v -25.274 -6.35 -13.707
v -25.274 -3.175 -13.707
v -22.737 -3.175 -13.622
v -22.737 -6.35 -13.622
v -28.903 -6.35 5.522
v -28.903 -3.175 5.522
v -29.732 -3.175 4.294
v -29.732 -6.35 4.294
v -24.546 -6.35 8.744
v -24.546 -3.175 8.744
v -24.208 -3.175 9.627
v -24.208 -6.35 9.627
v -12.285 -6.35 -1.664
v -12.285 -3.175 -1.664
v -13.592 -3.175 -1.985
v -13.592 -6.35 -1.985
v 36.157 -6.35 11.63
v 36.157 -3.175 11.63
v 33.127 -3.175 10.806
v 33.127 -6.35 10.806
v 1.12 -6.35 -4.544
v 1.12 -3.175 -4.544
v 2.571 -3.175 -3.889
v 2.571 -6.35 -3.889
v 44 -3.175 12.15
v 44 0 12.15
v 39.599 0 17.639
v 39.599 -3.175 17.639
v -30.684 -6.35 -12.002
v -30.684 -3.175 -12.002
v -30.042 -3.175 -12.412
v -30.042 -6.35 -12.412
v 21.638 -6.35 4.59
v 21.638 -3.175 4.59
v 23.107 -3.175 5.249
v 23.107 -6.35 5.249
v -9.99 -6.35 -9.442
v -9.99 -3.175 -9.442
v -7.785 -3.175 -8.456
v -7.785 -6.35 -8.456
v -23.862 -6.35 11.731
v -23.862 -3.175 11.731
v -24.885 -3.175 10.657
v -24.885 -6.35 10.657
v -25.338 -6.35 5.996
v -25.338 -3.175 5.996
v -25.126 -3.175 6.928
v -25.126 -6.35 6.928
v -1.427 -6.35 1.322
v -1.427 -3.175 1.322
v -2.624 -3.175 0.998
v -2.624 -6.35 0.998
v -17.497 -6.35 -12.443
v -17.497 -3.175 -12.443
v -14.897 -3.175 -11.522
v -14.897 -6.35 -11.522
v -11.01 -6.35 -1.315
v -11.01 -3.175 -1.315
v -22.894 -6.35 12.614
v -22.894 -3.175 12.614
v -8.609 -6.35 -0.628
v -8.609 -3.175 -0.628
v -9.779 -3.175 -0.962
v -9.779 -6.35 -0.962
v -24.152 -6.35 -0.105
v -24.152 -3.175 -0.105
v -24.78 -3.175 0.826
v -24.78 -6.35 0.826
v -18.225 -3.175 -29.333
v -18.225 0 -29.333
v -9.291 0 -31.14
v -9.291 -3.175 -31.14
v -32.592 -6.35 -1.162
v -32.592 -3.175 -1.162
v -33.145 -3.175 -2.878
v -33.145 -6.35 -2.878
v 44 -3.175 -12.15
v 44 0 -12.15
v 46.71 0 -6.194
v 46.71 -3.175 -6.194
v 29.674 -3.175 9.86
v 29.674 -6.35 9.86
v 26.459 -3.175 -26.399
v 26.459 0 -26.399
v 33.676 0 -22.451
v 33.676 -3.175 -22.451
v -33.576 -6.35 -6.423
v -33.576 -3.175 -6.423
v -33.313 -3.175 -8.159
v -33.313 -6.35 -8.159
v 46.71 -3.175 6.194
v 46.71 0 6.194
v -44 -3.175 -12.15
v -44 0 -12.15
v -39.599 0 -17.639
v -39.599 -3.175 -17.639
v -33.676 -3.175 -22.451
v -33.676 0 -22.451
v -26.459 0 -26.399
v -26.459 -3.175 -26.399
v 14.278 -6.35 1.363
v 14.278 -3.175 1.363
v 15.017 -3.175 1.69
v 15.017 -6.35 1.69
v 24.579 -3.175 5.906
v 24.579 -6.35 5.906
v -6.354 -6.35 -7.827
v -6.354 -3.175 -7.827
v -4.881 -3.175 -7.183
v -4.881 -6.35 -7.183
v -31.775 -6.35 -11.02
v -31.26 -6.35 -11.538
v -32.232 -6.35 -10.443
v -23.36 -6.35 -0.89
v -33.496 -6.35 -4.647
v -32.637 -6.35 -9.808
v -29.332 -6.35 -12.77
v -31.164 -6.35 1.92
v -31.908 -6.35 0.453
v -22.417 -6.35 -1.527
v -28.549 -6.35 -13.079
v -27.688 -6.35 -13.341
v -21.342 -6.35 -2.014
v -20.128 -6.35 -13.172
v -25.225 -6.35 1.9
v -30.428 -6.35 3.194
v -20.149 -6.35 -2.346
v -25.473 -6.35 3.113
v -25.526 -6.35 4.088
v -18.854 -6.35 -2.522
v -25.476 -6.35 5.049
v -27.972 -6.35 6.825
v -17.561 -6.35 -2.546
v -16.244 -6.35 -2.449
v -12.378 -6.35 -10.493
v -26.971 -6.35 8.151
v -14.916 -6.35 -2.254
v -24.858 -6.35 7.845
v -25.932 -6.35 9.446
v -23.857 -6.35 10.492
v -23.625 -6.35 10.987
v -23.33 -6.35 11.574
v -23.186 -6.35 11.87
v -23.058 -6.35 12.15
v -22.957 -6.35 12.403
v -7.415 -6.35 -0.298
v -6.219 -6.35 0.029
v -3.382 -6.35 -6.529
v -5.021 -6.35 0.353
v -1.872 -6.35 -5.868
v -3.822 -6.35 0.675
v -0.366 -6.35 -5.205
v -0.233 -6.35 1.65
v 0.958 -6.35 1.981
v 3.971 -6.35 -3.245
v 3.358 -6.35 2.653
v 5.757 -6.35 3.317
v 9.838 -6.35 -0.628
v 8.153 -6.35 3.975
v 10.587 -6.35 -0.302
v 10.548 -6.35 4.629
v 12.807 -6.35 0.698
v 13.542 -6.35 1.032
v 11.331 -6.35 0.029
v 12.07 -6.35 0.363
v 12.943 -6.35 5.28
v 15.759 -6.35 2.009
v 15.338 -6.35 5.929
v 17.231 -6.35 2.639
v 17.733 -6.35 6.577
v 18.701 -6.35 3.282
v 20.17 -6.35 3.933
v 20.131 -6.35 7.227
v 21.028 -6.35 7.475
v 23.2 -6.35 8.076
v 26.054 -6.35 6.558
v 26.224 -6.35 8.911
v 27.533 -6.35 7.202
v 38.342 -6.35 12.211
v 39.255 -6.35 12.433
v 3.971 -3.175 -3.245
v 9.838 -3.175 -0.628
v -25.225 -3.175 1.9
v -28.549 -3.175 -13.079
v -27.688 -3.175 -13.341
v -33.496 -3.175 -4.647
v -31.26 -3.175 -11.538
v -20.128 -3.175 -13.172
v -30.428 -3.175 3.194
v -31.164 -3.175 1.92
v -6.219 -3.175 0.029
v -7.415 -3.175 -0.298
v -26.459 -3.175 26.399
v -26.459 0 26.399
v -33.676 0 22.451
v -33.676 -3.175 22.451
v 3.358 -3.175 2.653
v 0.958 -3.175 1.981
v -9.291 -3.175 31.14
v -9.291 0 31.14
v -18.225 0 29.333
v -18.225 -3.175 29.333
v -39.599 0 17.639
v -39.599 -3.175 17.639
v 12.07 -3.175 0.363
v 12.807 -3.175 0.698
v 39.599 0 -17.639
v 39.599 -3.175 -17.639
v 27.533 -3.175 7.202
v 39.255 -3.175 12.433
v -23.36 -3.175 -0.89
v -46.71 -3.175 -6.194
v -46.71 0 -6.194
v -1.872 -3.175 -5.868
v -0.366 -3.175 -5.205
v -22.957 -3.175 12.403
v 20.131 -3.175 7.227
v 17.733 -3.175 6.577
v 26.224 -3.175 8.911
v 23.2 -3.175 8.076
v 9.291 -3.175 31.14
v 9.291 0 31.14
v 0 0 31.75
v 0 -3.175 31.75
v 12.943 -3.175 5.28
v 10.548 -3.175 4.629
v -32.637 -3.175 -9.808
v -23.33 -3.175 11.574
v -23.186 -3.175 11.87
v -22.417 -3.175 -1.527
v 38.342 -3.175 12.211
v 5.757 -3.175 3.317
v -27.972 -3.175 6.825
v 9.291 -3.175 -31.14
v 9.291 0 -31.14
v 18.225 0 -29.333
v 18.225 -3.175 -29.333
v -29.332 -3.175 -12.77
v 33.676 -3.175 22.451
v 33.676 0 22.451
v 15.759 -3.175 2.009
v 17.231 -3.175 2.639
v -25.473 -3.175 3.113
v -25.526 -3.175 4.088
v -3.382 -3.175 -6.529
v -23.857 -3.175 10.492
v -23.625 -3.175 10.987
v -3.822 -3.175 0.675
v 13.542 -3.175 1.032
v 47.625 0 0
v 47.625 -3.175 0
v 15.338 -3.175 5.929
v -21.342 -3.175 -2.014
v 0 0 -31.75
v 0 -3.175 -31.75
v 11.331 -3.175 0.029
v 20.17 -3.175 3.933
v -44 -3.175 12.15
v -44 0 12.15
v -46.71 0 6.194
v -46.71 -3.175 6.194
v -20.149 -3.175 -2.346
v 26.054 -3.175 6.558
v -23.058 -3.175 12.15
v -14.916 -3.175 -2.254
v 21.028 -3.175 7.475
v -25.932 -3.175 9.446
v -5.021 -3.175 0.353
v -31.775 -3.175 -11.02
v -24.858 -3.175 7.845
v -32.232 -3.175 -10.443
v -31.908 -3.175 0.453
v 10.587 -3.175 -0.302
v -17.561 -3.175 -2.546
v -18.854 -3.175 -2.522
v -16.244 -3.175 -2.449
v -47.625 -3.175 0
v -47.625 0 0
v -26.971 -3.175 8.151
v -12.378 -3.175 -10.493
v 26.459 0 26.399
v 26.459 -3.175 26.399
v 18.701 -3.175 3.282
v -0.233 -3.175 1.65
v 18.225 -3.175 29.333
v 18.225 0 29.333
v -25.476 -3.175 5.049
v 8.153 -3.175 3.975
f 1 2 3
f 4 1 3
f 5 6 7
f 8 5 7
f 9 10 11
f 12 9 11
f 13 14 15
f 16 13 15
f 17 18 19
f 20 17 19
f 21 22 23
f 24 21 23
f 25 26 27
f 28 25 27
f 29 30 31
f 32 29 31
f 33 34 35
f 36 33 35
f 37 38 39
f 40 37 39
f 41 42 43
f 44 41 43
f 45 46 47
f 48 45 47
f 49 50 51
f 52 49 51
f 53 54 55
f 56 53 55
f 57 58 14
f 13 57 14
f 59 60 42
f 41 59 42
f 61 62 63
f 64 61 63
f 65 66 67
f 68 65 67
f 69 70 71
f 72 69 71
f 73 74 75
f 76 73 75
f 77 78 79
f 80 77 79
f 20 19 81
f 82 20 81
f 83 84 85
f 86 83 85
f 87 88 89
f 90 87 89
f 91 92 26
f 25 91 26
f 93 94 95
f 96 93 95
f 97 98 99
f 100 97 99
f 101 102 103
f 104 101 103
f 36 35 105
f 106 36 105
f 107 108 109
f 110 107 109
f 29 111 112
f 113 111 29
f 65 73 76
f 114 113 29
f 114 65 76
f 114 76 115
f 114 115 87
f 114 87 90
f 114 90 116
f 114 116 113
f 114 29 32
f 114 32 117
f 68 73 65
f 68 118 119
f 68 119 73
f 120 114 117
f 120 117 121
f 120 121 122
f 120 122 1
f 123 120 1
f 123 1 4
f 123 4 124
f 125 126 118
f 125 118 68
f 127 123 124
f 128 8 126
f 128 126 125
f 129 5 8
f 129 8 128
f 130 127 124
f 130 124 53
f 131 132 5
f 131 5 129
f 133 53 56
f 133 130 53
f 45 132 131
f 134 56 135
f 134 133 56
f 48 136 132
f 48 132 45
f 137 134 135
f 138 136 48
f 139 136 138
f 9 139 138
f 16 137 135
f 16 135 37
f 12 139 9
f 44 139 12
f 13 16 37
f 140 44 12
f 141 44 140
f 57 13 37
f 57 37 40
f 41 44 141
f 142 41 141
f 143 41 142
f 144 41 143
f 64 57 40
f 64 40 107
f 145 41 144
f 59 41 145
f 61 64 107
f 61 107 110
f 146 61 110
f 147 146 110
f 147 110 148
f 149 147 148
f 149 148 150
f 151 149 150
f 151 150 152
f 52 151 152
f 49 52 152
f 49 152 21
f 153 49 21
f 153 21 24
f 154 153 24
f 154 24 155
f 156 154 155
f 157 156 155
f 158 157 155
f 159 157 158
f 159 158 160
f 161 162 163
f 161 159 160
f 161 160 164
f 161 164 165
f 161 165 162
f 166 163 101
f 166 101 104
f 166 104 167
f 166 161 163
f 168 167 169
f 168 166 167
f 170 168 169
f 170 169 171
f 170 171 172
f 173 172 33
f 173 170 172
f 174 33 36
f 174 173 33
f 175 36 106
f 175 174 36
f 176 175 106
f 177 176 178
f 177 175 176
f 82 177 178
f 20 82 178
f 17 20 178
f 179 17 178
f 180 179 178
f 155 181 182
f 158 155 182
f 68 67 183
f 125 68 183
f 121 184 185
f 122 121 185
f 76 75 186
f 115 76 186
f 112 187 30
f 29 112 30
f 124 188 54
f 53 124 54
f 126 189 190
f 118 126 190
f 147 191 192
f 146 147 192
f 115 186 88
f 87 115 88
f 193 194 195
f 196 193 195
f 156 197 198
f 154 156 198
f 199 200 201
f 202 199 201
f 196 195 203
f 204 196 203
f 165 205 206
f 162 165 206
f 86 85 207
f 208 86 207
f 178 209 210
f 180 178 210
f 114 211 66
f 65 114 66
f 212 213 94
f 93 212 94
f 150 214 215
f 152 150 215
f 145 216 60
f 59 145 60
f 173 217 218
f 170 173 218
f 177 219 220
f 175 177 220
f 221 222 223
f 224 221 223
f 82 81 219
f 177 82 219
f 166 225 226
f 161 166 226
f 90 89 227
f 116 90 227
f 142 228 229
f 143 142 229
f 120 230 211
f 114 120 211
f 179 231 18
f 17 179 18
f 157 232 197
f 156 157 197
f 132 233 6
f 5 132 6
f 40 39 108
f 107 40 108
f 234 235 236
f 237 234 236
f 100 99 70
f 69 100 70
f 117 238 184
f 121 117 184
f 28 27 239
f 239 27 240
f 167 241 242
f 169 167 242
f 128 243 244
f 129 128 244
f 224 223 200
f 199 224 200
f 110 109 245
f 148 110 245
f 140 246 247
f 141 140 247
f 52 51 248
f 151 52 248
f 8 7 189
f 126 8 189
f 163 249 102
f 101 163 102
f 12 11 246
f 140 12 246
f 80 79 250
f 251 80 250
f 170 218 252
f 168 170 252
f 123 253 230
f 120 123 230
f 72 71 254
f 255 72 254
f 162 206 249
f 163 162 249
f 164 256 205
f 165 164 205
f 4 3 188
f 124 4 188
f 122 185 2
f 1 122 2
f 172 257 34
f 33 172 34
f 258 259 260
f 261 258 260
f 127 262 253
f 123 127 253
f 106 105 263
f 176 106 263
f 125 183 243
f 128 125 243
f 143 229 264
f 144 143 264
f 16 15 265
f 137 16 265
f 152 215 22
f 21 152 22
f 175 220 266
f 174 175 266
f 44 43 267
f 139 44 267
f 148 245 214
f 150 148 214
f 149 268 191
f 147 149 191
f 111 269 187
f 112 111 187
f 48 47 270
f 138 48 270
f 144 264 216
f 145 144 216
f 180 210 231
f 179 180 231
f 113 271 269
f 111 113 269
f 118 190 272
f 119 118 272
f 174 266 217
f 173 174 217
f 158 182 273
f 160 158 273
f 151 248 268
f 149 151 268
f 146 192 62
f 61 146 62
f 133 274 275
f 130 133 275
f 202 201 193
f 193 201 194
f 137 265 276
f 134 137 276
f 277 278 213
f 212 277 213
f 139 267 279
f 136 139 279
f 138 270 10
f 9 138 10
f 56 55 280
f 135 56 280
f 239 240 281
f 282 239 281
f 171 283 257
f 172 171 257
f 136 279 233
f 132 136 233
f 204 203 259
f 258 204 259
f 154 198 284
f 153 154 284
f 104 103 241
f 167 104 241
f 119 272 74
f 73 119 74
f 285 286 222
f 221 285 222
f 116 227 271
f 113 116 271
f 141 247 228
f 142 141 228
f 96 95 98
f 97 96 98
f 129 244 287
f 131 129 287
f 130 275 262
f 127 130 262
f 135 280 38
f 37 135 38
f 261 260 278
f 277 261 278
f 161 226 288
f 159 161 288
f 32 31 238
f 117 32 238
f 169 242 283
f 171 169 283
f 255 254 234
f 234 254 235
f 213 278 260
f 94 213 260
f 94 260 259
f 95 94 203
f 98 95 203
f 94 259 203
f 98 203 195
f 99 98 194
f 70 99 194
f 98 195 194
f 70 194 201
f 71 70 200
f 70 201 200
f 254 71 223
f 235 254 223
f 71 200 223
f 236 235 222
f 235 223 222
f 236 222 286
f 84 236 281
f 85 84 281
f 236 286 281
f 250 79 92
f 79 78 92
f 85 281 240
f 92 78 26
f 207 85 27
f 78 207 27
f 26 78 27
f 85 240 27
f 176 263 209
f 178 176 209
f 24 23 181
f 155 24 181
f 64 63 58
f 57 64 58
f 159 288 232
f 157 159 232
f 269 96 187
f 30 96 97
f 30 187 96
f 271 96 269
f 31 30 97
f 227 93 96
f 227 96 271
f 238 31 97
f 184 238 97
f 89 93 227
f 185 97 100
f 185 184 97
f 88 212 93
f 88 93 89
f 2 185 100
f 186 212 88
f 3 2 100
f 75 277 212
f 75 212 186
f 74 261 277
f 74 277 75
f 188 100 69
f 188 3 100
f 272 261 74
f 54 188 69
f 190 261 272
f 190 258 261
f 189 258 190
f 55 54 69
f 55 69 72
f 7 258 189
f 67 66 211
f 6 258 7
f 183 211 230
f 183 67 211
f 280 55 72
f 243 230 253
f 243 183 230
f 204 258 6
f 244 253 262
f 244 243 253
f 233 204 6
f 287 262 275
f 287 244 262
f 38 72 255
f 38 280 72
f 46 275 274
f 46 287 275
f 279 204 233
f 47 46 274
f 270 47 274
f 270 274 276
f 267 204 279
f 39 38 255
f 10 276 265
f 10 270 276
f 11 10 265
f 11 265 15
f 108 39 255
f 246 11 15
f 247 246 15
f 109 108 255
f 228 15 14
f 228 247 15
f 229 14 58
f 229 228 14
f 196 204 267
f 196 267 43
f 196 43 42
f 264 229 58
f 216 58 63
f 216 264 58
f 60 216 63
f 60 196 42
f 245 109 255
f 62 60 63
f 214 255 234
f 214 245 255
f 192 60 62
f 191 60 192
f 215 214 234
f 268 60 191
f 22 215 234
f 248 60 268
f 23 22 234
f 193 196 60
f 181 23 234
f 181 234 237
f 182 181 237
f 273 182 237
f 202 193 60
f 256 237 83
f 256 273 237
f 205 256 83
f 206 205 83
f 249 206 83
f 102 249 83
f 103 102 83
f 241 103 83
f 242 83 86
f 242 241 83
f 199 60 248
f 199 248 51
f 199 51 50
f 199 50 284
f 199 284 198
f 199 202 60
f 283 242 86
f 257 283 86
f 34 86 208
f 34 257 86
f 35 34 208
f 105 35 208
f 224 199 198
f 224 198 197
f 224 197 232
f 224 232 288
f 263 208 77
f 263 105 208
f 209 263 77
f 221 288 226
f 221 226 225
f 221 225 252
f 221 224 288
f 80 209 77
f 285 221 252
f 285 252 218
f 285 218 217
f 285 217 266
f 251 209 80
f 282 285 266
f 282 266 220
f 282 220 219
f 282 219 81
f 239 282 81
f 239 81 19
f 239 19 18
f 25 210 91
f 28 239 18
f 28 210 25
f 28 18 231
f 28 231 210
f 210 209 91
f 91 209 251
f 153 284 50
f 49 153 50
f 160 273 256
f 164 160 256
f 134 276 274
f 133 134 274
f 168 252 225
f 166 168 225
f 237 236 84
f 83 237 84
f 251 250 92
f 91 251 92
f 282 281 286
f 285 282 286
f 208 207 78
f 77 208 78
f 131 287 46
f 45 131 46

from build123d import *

# Parameters (mm, degrees)
F1_DEPTH = 3.175
F2_DEPTH = 6.35


# Not quite as in the source:
# - a length typed as a fraction of an inch, garbled in the dataset ("3 / 203.2 mm" for 3/8 in), is restored


with BuildPart() as f1:
    # F0 (on Front) → F1 (new body)
    with BuildSketch(Plane.XZ):
        Polygon((46.7098888, -6.1941202), (47.625, 0), (46.7098888, 6.1941202), (43.9997596, 12.150217), (39.598727, 17.6393602), (33.675955, 22.4506536), (26.4590276, 26.3991598), (18.2252874, 29.33319), (9.2911676, 31.1399428), (0, 31.75), (-9.291193, 31.1399428), (-18.2253128, 29.33319), (-26.459053, 26.3991598), (-33.6759804, 22.4506536), (-39.5987524, 17.6393602), (-43.999785, 12.150217), (-46.7099142, 6.1941202), (-47.625, 0), (-46.7099142, -6.1941202), (-43.999785, -12.1501916), (-39.5987524, -17.6393602), (-33.6759804, -22.4506282), (-26.459053, -26.3991598), (-18.2253128, -29.3331646), (-9.291193, -31.1399174), (0, -31.75), (9.2911676, -31.1399174), (18.2252874, -29.3331646), (26.4590276, -26.3991598), (33.675955, -22.4506282), (39.598727, -17.6393602), (43.9997596, -12.1501916), align=None)
        Polygon((38.341681, 12.2114056), (39.2552936, 12.4328174), (27.5334984, 7.2016112), (26.0539992, 6.5582038), (24.5790974, 5.9062112), (23.1074976, 5.2491132), (21.6381838, 4.590415), (20.1697844, 3.9334948), (18.7011818, 3.2820102), (17.2311822, 2.6391108), (15.7585918, 2.008505), (15.0165816, 1.6895064), (14.2783814, 1.3633196), (13.5421878, 1.0321036), (12.8065784, 0.6979158), (12.0698768, 0.362712), (11.3305844, 0.028702), (10.5870756, -0.3020822), (9.8377756, -0.6275832), (3.9710868, -3.244596), (2.5708864, -3.8890956), (1.1199876, -4.5439838), (-0.366014, -5.2049934), (-1.8718022, -5.8679842), (-3.38201, -6.5287906), (-4.8813212, -7.1831962), (-6.3541148, -7.8269846), (-7.7852016, -8.4560918), (-9.9900232, -9.4423992), (-12.3777248, -10.4928924), (-14.8971, -11.5218972), (-17.497425, -12.4434854), (-20.1276204, -13.1720844), (-22.7367084, -13.6216898), (-25.2738128, -13.706602), (-27.6880066, -13.341096), (-28.5486094, -13.0792982), (-29.3320216, -12.7701802), (-30.0423072, -12.4116846), (-30.6835048, -12.0018048), (-31.2595006, -11.5384834), (-31.774511, -11.0196884), (-32.2323206, -10.4433878), (-32.6370188, -9.8076004), (-33.312608, -8.1586832), (-33.575625, -6.422898), (-33.4963008, -4.6470824), (-33.1451204, -2.8779978), (-32.5923148, -1.1624818), (-31.9084198, 0.4526026), (-31.1636156, 1.9203162), (-30.4284126, 3.1938976), (-29.7318176, 4.2935144), (-28.9025076, 5.5216044), (-27.9718008, 6.8250054), (-26.9710154, 8.1507076), (-25.9315204, 9.4455996), (-24.8846086, 10.6565192), (-23.8617252, 11.7305074), (-22.8942138, 12.614402), (-22.9568248, 12.4025152), (-23.0575104, 12.1500138), (-23.185501, 11.8695978), (-23.3301032, 11.5739164), (-23.6254036, 10.9873034), (-23.857204, 10.491597), (-24.207724, 9.6268032), (-24.5462044, 8.744204), (-24.8575068, 7.8445106), (-25.1264166, 6.9283072), (-25.3376176, 5.9964066), (-25.4759206, 5.0494946), (-25.5260094, 4.0882062), (-25.4729234, 3.1132018), (-25.225121, 1.8998184), (-24.779605, 0.8263128), (-24.1524028, -0.1045972), (-23.3597196, -0.8900922), (-22.417405, -1.5274036), (-21.3416134, -2.0136866), (-20.1485246, -2.3462996), (-18.8540136, -2.5223978), (-17.5612044, -2.5464008), (-16.2439096, -2.449195), (-14.9162008, -2.2540976), (-13.591921, -1.9846036), (-12.2850148, -1.6639032), (-11.009503, -1.3152882), (-9.7794064, -0.9621012), (-8.6086188, -0.6277864), (-7.4149204, -0.2975864), (-6.2186058, 0.028702), (-5.0205132, 0.3525012), (-3.8219126, 0.6751066), (-2.6237184, 0.9980168), (-1.4270228, 1.3224002), (-0.2328164, 1.6497046), (0.9576816, 1.9814032), (3.358388, 2.652903), (5.7565798, 3.3170114), (8.152892, 3.9752016), (10.547985, 4.6289976), (12.942697, 5.2796186), (15.3375868, 5.928614), (17.7332894, 6.5773046), (20.1306938, 7.227316), (21.0277964, 7.4752962), (23.2002838, 8.0761078), (26.2238998, 8.910701), (29.6740834, 9.860407), (33.1267816, 10.806303), (36.1573826, 11.6296186), align=None, mode=Mode.SUBTRACT)
    extrude(amount=F1_DEPTH)

    # F0 (on Front) → F2 (join)
    with BuildSketch(Plane.XZ):
        Polygon((27.5334984, 7.2016112), (39.2552936, 12.4328174), (38.341681, 12.2114056), (36.1573826, 11.6296186), (33.1267816, 10.806303), (29.6740834, 9.860407), (26.2238998, 8.910701), (23.2002838, 8.0761078), (21.0277964, 7.4752962), (20.1306938, 7.227316), (17.7332894, 6.5773046), (15.3375868, 5.928614), (12.942697, 5.2796186), (10.547985, 4.6289976), (8.152892, 3.9752016), (5.7565798, 3.3170114), (3.358388, 2.652903), (0.9576816, 1.9814032), (-0.2328164, 1.6497046), (-1.4270228, 1.3224002), (-2.6237184, 0.9980168), (-3.8219126, 0.6751066), (-5.0205132, 0.3525012), (-6.2186058, 0.028702), (-7.4149204, -0.2975864), (-8.6086188, -0.6277864), (-9.7794064, -0.9621012), (-11.009503, -1.3152882), (-12.2850148, -1.6639032), (-13.591921, -1.9846036), (-14.9162008, -2.2540976), (-16.2439096, -2.449195), (-17.5612044, -2.5464008), (-18.8540136, -2.5223978), (-20.1485246, -2.3462996), (-21.3416134, -2.0136866), (-22.417405, -1.5274036), (-23.3597196, -0.8900922), (-24.1524028, -0.1045972), (-24.779605, 0.8263128), (-25.225121, 1.8998184), (-25.4729234, 3.1132018), (-25.5260094, 4.0882062), (-25.4759206, 5.0494946), (-25.3376176, 5.9964066), (-25.1264166, 6.9283072), (-24.8575068, 7.8445106), (-24.5462044, 8.744204), (-24.207724, 9.6268032), (-23.857204, 10.491597), (-23.6254036, 10.9873034), (-23.3301032, 11.5739164), (-23.185501, 11.8695978), (-23.0575104, 12.1500138), (-22.9568248, 12.4025152), (-22.8942138, 12.614402), (-23.8617252, 11.7305074), (-24.8846086, 10.6565192), (-25.9315204, 9.4455996), (-26.9710154, 8.1507076), (-27.9718008, 6.8250054), (-28.9025076, 5.5216044), (-29.7318176, 4.2935144), (-30.4284126, 3.1938976), (-31.1636156, 1.9203162), (-31.9084198, 0.4526026), (-32.5923148, -1.1624818), (-33.1451204, -2.8779978), (-33.4963008, -4.6470824), (-33.575625, -6.422898), (-33.312608, -8.1586832), (-32.6370188, -9.8076004), (-32.2323206, -10.4433878), (-31.774511, -11.0196884), (-31.2595006, -11.5384834), (-30.6835048, -12.0018048), (-30.0423072, -12.4116846), (-29.3320216, -12.7701802), (-28.5486094, -13.0792982), (-27.6880066, -13.341096), (-25.2738128, -13.706602), (-22.7367084, -13.6216898), (-20.1276204, -13.1720844), (-17.497425, -12.4434854), (-14.8971, -11.5218972), (-12.3777248, -10.4928924), (-9.9900232, -9.4423992), (-7.7852016, -8.4560918), (-6.3541148, -7.8269846), (-4.8813212, -7.1831962), (-3.38201, -6.5287906), (-1.8718022, -5.8679842), (-0.366014, -5.2049934), (1.1199876, -4.5439838), (2.5708864, -3.8890956), (3.9710868, -3.244596), (9.8377756, -0.6275832), (10.5870756, -0.3020822), (11.3305844, 0.028702), (12.0698768, 0.362712), (12.8065784, 0.6979158), (13.5421878, 1.0321036), (14.2783814, 1.3633196), (15.0165816, 1.6895064), (15.7585918, 2.008505), (17.2311822, 2.6391108), (18.7011818, 3.2820102), (20.1697844, 3.9334948), (21.6381838, 4.590415), (23.1074976, 5.2491132), (24.5790974, 5.9062112), (26.0539992, 6.5582038), align=None)
    extrude(amount=F2_DEPTH)


solid = f1.part
